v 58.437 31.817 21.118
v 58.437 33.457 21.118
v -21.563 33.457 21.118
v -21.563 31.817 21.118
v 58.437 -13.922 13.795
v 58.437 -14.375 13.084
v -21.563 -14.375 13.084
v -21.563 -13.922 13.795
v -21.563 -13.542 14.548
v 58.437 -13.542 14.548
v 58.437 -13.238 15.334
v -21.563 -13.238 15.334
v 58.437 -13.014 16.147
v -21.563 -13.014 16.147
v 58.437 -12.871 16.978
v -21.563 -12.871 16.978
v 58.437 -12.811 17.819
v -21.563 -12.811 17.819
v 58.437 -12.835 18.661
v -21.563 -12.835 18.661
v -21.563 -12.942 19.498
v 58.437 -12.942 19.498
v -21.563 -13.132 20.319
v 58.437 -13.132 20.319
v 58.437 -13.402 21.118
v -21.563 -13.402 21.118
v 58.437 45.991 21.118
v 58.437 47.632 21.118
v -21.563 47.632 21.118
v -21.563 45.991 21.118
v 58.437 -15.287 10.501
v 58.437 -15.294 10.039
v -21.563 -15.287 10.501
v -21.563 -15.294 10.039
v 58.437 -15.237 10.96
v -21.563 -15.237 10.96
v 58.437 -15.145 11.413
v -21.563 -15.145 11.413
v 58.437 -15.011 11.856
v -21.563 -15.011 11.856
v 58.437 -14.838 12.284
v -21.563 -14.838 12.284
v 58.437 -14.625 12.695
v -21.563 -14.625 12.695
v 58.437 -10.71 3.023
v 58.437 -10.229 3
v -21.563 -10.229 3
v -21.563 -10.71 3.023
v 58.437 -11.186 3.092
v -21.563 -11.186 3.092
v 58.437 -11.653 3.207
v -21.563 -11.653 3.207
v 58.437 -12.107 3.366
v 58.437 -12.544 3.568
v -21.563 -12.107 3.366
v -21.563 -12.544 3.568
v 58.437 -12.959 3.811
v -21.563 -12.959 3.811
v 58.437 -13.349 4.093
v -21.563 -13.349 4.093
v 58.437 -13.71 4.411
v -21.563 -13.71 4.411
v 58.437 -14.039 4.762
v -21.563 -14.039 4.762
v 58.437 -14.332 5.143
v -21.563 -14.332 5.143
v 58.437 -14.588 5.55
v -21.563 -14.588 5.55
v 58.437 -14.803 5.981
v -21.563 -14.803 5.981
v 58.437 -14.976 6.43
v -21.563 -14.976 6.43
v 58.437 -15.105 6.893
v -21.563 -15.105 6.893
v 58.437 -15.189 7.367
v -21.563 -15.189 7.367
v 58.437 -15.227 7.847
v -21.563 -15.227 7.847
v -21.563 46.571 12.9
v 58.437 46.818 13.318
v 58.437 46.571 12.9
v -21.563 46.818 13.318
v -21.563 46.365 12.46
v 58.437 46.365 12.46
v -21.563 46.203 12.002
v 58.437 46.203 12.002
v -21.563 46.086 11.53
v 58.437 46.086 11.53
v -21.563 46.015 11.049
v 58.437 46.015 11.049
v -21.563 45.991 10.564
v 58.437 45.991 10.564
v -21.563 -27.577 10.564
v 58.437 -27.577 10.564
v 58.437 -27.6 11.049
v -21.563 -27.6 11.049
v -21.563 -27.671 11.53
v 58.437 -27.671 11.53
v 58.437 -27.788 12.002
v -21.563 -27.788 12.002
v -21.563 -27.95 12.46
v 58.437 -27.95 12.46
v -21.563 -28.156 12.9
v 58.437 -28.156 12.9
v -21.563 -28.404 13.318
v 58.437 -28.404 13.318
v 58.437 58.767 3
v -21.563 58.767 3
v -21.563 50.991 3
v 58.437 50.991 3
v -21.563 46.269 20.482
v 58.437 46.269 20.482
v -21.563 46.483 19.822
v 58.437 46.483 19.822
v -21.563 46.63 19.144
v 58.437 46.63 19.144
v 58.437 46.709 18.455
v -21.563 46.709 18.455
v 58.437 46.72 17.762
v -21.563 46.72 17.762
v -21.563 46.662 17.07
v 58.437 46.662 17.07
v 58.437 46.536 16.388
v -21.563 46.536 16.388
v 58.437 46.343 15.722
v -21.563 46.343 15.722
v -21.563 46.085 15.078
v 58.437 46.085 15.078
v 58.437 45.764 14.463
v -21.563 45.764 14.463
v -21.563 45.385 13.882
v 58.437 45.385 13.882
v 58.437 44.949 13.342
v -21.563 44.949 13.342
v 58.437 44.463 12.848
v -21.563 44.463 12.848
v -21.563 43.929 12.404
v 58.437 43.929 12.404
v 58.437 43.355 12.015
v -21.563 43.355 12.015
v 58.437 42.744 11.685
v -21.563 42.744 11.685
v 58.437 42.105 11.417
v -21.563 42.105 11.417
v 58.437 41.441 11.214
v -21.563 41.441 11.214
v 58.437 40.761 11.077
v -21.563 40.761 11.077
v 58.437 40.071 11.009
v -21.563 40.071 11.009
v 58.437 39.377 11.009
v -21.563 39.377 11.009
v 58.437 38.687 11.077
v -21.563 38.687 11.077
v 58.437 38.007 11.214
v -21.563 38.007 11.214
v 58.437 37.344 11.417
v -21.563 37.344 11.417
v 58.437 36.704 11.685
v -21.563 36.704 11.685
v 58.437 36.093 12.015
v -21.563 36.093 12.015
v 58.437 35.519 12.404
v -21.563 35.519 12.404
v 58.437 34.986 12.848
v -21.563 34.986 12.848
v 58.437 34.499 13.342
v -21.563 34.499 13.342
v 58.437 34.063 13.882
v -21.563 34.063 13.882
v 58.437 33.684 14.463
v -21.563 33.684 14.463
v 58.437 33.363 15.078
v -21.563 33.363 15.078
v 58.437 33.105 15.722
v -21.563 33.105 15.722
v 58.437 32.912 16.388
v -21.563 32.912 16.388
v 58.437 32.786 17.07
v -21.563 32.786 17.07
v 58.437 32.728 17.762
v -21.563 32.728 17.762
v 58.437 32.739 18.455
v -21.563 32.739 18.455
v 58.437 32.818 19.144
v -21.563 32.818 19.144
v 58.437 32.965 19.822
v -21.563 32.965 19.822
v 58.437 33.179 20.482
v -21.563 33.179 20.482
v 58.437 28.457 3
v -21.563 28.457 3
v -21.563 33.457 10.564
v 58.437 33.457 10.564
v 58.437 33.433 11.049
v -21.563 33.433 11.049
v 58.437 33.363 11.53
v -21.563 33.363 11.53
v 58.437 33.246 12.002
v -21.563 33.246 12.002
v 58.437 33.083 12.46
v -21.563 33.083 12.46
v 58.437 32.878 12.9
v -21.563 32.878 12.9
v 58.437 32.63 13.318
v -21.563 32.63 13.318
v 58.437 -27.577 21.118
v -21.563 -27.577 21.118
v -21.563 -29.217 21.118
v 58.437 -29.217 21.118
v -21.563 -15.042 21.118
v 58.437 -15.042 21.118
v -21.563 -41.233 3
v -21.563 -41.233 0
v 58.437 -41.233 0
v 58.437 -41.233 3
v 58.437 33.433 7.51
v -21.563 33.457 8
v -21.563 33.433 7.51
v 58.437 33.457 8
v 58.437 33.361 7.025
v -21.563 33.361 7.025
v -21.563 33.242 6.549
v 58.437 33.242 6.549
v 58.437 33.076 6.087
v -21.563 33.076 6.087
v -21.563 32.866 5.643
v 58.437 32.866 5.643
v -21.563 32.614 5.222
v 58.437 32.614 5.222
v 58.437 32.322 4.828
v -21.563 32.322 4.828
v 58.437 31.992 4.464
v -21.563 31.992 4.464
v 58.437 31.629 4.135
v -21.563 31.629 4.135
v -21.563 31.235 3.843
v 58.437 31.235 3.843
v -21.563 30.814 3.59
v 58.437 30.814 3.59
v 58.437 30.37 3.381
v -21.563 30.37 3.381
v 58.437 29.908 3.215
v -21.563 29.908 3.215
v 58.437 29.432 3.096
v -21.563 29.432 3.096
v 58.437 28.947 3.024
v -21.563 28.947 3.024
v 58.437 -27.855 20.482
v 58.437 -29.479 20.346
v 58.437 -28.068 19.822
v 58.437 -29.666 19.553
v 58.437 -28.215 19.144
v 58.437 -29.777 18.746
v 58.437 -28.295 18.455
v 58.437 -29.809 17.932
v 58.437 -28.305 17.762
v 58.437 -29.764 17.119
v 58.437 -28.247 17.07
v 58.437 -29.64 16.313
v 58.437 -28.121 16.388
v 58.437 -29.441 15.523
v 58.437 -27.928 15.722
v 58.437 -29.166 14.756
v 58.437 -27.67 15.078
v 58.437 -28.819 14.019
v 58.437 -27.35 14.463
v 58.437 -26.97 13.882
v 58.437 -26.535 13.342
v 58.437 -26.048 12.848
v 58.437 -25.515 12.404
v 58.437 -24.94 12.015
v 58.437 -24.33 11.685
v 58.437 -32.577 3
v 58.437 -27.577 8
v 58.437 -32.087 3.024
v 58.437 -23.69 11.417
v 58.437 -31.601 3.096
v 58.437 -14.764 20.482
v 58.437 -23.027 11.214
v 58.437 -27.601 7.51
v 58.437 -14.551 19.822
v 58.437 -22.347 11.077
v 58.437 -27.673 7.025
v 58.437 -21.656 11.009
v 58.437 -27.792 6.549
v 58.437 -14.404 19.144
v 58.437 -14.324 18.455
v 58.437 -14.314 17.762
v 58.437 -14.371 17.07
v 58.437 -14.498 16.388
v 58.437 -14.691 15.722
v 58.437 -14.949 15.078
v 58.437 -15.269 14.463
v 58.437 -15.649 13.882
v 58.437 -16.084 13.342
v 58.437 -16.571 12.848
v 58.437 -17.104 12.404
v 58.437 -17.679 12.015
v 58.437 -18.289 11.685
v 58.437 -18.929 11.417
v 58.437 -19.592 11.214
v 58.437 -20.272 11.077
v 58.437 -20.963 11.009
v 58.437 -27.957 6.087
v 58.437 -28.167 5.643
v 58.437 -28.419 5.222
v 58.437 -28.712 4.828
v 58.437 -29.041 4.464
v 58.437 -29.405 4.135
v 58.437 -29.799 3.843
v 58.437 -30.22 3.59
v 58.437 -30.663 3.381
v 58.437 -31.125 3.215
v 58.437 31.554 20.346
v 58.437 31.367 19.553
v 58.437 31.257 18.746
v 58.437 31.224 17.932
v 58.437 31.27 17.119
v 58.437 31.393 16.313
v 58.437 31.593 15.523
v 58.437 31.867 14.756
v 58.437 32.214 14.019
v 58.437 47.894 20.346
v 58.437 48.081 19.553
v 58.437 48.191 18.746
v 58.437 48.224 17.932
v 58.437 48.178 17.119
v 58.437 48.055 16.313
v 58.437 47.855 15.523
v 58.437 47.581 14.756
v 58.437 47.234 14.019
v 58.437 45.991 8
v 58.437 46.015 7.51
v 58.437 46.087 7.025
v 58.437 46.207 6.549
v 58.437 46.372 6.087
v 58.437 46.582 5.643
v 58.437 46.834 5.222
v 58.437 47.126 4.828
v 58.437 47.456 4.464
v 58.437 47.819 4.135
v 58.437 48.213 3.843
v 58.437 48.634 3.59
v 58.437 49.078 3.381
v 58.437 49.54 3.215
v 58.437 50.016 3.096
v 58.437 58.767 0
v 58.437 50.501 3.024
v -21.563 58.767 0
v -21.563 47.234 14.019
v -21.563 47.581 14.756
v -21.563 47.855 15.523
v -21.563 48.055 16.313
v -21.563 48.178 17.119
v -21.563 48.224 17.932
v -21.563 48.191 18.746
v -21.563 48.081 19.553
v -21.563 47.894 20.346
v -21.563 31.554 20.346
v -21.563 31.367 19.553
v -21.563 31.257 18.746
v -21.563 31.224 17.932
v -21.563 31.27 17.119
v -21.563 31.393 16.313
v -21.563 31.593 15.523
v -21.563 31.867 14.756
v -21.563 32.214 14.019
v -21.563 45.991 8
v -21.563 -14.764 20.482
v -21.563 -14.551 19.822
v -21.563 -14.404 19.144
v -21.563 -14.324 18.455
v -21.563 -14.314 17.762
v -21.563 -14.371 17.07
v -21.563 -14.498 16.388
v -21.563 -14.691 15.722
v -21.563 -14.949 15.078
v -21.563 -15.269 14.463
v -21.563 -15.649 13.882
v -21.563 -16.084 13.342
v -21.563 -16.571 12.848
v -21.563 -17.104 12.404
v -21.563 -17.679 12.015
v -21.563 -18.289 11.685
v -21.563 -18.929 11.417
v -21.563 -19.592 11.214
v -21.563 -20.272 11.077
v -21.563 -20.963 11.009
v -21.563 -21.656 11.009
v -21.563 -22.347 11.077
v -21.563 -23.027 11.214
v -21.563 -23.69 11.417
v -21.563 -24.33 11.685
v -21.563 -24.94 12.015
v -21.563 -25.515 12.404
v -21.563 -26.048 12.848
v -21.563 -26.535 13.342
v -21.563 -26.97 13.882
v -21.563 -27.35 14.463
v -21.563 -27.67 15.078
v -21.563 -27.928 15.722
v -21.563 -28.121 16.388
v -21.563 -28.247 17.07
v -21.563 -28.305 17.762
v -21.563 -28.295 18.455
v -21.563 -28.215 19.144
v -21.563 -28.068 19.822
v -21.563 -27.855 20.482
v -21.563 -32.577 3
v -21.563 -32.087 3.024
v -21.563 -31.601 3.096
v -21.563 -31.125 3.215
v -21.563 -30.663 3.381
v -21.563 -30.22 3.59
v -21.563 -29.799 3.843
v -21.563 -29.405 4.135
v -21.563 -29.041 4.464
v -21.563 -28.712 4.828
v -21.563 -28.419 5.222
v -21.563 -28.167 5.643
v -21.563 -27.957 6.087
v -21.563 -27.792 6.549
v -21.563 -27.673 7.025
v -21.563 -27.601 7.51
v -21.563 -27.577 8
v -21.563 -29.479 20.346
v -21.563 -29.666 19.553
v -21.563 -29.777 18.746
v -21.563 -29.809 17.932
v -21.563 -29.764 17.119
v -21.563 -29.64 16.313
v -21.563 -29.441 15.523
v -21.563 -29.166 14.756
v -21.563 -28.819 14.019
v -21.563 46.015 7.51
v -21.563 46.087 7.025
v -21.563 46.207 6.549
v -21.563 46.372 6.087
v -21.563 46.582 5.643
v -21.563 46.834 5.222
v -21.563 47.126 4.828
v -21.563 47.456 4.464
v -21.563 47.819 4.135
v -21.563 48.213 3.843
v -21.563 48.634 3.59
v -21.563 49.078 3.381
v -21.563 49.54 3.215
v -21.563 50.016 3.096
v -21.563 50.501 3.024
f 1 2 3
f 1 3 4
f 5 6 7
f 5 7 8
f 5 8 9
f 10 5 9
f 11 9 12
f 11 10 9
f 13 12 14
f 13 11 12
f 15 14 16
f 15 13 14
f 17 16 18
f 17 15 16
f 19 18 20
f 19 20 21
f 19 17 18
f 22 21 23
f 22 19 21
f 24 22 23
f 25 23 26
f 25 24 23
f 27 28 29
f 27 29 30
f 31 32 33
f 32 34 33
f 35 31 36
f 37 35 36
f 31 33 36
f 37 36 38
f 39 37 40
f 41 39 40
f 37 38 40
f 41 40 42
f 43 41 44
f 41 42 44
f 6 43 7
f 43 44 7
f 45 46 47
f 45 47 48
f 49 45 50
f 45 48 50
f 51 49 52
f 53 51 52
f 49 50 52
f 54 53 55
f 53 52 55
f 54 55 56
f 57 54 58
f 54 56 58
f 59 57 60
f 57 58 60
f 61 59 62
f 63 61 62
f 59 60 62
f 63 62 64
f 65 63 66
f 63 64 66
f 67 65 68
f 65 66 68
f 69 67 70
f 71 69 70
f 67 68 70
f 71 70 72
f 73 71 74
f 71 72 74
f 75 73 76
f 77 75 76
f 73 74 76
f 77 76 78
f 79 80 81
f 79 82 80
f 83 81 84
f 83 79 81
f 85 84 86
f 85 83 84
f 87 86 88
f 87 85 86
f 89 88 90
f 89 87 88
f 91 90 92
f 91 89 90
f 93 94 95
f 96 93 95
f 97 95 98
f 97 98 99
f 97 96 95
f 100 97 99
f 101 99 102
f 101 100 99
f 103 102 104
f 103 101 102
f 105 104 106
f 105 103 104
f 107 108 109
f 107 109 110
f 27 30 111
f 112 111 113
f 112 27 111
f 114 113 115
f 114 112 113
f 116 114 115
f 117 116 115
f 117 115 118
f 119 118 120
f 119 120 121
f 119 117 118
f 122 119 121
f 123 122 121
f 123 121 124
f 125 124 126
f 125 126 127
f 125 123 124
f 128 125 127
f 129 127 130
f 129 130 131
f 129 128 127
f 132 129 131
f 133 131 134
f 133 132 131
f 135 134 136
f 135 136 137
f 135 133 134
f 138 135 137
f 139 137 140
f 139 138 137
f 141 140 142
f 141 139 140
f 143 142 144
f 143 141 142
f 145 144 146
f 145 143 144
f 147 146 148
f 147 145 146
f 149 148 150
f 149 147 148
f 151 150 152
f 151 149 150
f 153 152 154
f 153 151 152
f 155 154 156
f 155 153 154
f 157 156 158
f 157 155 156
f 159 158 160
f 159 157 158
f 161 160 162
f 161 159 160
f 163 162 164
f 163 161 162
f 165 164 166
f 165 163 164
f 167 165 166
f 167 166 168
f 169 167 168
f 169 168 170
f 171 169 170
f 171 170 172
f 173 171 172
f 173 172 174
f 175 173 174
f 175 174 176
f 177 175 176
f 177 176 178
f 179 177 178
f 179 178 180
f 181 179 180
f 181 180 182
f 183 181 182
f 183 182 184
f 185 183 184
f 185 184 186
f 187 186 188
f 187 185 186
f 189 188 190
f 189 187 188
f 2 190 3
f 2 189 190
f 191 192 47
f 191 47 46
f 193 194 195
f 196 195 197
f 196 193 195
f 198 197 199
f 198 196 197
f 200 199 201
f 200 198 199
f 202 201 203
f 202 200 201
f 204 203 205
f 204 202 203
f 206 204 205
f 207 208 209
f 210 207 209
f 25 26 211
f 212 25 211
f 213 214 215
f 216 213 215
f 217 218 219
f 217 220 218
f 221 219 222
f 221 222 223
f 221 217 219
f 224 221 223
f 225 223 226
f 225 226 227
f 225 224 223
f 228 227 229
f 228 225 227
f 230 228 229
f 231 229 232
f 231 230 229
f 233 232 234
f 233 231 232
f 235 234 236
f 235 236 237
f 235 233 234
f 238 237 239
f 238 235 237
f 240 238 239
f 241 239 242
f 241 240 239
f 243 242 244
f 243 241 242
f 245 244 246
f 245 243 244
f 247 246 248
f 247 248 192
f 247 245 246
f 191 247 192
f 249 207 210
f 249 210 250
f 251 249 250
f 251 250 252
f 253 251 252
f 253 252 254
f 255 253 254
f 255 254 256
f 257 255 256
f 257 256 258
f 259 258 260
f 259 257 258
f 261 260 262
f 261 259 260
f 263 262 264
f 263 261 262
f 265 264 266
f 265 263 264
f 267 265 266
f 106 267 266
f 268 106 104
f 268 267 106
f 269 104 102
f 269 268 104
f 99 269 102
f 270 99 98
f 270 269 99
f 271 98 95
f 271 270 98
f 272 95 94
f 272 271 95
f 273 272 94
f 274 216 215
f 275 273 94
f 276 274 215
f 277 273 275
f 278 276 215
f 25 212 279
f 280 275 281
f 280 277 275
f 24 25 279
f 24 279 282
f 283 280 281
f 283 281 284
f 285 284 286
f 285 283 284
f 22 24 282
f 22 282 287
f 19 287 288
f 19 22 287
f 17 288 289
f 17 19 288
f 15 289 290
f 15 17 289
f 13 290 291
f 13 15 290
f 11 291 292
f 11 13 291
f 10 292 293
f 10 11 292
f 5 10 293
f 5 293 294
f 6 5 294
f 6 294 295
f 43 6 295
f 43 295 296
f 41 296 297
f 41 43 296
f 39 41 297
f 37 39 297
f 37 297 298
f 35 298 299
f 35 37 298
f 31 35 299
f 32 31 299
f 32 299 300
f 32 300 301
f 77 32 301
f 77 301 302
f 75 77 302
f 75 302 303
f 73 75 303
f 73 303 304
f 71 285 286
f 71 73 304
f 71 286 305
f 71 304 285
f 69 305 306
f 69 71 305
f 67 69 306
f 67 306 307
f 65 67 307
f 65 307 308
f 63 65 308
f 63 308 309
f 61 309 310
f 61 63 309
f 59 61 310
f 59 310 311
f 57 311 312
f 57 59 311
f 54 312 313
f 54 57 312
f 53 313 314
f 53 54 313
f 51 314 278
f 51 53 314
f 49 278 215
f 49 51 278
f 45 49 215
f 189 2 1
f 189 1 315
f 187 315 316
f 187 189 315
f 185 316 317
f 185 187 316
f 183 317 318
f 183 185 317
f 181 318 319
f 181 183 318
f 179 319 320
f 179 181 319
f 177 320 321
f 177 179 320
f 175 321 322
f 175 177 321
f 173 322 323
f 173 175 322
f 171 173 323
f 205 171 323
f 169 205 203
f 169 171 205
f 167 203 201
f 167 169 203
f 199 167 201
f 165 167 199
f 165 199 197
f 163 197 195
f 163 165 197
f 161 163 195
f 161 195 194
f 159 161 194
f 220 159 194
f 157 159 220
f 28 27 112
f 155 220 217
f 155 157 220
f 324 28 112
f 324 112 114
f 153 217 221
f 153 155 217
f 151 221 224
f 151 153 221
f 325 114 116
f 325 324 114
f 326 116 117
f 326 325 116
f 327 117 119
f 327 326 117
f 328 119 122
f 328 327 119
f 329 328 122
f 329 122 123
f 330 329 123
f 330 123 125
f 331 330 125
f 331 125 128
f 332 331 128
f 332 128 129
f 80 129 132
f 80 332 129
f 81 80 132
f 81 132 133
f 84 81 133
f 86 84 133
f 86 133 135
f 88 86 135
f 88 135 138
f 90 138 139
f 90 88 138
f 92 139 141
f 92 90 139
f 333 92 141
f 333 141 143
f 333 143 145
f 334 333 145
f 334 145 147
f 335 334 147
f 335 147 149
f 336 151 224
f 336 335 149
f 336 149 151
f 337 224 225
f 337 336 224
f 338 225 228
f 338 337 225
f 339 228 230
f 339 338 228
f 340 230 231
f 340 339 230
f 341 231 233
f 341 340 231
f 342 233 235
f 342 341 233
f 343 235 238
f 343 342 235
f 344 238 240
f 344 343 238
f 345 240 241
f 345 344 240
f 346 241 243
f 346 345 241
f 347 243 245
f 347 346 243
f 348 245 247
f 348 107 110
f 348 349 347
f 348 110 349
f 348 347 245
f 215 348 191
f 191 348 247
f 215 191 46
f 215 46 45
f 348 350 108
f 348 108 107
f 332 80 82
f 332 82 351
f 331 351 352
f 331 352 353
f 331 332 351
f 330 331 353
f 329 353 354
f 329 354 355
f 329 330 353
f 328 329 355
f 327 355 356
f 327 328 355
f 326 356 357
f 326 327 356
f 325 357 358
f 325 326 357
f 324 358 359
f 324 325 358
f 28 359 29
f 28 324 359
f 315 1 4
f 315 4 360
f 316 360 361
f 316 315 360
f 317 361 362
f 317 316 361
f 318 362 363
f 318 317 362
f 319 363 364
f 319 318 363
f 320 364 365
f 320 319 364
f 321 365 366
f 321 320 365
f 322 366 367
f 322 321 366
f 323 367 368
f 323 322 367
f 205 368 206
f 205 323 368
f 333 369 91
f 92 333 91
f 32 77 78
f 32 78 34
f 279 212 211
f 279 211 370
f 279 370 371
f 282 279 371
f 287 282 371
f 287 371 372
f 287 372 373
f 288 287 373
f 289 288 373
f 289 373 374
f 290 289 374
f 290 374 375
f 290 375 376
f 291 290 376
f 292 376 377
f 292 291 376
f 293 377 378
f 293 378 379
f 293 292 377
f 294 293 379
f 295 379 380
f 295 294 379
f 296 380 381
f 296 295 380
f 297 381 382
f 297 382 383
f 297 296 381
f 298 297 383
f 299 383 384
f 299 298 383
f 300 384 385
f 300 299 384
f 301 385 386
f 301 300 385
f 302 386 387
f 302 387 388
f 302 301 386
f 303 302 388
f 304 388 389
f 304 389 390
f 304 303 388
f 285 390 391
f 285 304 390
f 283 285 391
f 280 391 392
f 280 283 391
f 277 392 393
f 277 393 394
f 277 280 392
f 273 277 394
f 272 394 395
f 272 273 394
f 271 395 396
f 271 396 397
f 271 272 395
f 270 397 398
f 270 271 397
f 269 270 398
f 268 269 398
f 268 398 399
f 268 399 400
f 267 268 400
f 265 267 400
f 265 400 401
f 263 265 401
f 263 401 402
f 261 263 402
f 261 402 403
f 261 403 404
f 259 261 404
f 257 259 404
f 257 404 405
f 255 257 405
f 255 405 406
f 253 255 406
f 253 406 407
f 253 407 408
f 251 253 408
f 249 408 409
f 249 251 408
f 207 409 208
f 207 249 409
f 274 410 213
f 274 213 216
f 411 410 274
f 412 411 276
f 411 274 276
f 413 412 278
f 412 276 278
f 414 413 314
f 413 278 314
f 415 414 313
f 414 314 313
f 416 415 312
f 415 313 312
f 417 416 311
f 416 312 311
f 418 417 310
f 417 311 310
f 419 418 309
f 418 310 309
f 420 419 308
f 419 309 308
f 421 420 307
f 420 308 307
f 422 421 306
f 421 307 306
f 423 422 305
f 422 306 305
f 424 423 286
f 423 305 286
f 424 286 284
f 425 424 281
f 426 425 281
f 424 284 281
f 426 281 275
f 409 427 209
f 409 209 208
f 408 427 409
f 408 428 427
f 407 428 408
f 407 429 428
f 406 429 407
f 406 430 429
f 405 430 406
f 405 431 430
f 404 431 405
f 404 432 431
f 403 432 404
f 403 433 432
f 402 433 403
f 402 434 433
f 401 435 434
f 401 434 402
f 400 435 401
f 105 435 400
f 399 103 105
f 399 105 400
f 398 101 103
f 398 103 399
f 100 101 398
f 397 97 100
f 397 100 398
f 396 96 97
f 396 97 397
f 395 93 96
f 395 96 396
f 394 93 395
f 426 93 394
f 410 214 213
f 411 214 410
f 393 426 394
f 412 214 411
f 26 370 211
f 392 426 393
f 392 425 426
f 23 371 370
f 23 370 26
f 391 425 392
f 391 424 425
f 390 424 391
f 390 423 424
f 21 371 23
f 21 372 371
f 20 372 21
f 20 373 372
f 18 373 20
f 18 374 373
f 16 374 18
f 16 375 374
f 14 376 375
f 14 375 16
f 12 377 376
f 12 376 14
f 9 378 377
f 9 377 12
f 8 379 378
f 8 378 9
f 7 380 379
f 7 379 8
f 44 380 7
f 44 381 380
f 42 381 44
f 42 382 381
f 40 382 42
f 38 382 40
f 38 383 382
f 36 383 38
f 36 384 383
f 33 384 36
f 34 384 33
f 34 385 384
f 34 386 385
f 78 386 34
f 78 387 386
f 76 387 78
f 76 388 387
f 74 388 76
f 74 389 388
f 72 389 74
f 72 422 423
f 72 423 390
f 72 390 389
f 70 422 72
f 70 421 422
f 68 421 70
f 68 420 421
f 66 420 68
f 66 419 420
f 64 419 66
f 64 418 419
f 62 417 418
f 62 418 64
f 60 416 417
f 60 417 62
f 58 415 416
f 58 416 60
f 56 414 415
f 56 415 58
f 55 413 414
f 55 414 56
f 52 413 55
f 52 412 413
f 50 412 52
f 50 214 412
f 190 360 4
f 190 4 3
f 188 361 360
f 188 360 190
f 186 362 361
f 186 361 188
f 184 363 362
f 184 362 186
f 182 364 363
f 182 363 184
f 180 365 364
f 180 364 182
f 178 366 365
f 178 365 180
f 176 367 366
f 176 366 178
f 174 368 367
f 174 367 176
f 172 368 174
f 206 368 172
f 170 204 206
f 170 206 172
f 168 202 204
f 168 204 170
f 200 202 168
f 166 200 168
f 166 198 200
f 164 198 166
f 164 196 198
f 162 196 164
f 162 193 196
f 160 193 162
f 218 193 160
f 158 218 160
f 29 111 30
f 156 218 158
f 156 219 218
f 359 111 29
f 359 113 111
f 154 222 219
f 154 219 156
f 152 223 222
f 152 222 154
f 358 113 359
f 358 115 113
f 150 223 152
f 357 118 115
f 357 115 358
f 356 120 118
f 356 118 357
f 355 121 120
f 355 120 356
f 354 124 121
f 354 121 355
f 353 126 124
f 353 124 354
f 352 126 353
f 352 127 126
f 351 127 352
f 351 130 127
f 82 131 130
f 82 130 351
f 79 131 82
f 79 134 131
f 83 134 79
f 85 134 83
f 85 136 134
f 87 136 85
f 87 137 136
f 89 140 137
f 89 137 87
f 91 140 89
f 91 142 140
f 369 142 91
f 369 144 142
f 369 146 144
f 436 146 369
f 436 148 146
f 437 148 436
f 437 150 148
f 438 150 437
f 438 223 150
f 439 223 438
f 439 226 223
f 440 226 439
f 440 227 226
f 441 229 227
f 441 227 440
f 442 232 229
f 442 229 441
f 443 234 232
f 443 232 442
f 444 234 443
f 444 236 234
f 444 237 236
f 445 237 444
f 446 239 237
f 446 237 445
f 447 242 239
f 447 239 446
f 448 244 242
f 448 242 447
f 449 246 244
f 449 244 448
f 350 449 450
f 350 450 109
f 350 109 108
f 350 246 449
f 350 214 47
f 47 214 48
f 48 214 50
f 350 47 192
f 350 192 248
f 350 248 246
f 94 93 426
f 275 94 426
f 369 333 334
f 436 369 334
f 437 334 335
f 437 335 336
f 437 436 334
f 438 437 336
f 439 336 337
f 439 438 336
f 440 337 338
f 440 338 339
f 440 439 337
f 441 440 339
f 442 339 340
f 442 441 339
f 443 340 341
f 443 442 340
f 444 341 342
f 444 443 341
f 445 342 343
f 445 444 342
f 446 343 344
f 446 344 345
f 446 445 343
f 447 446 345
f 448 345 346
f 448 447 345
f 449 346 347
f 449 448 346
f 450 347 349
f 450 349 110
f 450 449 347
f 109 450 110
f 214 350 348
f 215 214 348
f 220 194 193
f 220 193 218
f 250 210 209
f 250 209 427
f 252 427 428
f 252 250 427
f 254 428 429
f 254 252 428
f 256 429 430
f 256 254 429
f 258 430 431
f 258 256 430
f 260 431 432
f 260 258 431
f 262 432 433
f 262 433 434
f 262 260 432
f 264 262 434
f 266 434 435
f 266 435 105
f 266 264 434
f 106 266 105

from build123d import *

# Parameters (mm, degrees)
SKETCH1_W           = 80
SKETCH1_H           = 100
BOSS_EXTRUDE1_DEPTH = 3
BOSS_EXTRUDE3_DEPTH = 80
FILLET1_R           = 5
FILLET2_R           = 5


with BuildPart() as part:
    # Sketch1 → Boss-Extrude1 (new body)
    with BuildSketch(Plane.XY):
        with Locations((18.436653688, 8.767310739)):
            Rectangle(SKETCH1_W, SKETCH1_H)
    extrude(amount=BOSS_EXTRUDE1_DEPTH)

    # Sketch3 → Boss-Extrude3 (add)
    with BuildSketch(Plane(origin=(58.436653688, 0, 0), x_dir=(0, 0, -1), z_dir=(1, 0, 0))):
        with BuildLine():
            Line((-1.837245717, 45.99131425), (-12.257916981, 45.99131425))
            ThreePointArc((-12.257916981, 45.99131425), (-16.452700501, 48.082041529), (-21.117934797, 47.631554803))
            Line((-21.117934797, 47.631554803), (-21.117934797, 45.99131425))
            ThreePointArc((-21.117934797, 45.99131425), (-11, 39.72405946), (-21.117934797, 33.45680467))
            Line((-21.117934797, 33.45680467), (-21.117934797, 31.816564117))
            ThreePointArc((-21.117934797, 31.816564117), (-16.452700501, 31.366077392), (-12.257916981, 33.45680467))
            Line((-12.257916981, 33.45680467), (-1.837245717, 33.45680467))
            Line((-1.837245717, 33.45680467), (-1.837245717, 45.99131425))
        make_face()
        with BuildLine():
            Line((-21.117934797, -13.401976374), (-21.117934797, -15.042216928))
            ThreePointArc((-21.117934797, -15.042216928), (-11, -21.309471718), (-21.117934797, -27.576726507))
            Line((-21.117934797, -27.576726507), (-21.117934797, -29.216967061))
            ThreePointArc((-21.117934797, -29.216967061), (-16.452700501, -29.667453786), (-12.257916981, -27.576726507))
            Line((-12.257916981, -27.576726507), (-1.837245717, -27.576726507))
            Line((-1.837245717, -27.576726507), (-1.837245717, -15.042216928))
            Line((-1.837245717, -15.042216928), (-11.936738174, -15.352387193))
            ThreePointArc((-11.936738174, -15.352387193), (-16.233714798, -12.995012229), (-21.117934797, -13.401976374))
        make_face()
    extrude(amount=-BOSS_EXTRUDE3_DEPTH)

    # Fillet1
    fillet1_edges = [part.edges().sort_by_distance(p)[0] for p in [
        (18.436653688, 45.99131425, 12.257916981),
        (18.436653688, 33.45680467, 12.257916981),
        (18.436653688, -15.352387193, 11.936738174),
        (18.436653688, -27.576726507, 12.257916981),
    ]]
    fillet(fillet1_edges, radius=FILLET1_R)

    # Fillet2
    fillet2_edges = [part.edges().sort_by_distance(p)[0] for p in [
        (18.436653688, 33.45680467, 3),
        (18.436653688, 45.99131425, 3),
        (18.436653688, -27.576726507, 3),
        (18.436653688, -15.077926822, 3),
    ]]
    fillet(fillet2_edges, radius=FILLET2_R)


solid = part.part
